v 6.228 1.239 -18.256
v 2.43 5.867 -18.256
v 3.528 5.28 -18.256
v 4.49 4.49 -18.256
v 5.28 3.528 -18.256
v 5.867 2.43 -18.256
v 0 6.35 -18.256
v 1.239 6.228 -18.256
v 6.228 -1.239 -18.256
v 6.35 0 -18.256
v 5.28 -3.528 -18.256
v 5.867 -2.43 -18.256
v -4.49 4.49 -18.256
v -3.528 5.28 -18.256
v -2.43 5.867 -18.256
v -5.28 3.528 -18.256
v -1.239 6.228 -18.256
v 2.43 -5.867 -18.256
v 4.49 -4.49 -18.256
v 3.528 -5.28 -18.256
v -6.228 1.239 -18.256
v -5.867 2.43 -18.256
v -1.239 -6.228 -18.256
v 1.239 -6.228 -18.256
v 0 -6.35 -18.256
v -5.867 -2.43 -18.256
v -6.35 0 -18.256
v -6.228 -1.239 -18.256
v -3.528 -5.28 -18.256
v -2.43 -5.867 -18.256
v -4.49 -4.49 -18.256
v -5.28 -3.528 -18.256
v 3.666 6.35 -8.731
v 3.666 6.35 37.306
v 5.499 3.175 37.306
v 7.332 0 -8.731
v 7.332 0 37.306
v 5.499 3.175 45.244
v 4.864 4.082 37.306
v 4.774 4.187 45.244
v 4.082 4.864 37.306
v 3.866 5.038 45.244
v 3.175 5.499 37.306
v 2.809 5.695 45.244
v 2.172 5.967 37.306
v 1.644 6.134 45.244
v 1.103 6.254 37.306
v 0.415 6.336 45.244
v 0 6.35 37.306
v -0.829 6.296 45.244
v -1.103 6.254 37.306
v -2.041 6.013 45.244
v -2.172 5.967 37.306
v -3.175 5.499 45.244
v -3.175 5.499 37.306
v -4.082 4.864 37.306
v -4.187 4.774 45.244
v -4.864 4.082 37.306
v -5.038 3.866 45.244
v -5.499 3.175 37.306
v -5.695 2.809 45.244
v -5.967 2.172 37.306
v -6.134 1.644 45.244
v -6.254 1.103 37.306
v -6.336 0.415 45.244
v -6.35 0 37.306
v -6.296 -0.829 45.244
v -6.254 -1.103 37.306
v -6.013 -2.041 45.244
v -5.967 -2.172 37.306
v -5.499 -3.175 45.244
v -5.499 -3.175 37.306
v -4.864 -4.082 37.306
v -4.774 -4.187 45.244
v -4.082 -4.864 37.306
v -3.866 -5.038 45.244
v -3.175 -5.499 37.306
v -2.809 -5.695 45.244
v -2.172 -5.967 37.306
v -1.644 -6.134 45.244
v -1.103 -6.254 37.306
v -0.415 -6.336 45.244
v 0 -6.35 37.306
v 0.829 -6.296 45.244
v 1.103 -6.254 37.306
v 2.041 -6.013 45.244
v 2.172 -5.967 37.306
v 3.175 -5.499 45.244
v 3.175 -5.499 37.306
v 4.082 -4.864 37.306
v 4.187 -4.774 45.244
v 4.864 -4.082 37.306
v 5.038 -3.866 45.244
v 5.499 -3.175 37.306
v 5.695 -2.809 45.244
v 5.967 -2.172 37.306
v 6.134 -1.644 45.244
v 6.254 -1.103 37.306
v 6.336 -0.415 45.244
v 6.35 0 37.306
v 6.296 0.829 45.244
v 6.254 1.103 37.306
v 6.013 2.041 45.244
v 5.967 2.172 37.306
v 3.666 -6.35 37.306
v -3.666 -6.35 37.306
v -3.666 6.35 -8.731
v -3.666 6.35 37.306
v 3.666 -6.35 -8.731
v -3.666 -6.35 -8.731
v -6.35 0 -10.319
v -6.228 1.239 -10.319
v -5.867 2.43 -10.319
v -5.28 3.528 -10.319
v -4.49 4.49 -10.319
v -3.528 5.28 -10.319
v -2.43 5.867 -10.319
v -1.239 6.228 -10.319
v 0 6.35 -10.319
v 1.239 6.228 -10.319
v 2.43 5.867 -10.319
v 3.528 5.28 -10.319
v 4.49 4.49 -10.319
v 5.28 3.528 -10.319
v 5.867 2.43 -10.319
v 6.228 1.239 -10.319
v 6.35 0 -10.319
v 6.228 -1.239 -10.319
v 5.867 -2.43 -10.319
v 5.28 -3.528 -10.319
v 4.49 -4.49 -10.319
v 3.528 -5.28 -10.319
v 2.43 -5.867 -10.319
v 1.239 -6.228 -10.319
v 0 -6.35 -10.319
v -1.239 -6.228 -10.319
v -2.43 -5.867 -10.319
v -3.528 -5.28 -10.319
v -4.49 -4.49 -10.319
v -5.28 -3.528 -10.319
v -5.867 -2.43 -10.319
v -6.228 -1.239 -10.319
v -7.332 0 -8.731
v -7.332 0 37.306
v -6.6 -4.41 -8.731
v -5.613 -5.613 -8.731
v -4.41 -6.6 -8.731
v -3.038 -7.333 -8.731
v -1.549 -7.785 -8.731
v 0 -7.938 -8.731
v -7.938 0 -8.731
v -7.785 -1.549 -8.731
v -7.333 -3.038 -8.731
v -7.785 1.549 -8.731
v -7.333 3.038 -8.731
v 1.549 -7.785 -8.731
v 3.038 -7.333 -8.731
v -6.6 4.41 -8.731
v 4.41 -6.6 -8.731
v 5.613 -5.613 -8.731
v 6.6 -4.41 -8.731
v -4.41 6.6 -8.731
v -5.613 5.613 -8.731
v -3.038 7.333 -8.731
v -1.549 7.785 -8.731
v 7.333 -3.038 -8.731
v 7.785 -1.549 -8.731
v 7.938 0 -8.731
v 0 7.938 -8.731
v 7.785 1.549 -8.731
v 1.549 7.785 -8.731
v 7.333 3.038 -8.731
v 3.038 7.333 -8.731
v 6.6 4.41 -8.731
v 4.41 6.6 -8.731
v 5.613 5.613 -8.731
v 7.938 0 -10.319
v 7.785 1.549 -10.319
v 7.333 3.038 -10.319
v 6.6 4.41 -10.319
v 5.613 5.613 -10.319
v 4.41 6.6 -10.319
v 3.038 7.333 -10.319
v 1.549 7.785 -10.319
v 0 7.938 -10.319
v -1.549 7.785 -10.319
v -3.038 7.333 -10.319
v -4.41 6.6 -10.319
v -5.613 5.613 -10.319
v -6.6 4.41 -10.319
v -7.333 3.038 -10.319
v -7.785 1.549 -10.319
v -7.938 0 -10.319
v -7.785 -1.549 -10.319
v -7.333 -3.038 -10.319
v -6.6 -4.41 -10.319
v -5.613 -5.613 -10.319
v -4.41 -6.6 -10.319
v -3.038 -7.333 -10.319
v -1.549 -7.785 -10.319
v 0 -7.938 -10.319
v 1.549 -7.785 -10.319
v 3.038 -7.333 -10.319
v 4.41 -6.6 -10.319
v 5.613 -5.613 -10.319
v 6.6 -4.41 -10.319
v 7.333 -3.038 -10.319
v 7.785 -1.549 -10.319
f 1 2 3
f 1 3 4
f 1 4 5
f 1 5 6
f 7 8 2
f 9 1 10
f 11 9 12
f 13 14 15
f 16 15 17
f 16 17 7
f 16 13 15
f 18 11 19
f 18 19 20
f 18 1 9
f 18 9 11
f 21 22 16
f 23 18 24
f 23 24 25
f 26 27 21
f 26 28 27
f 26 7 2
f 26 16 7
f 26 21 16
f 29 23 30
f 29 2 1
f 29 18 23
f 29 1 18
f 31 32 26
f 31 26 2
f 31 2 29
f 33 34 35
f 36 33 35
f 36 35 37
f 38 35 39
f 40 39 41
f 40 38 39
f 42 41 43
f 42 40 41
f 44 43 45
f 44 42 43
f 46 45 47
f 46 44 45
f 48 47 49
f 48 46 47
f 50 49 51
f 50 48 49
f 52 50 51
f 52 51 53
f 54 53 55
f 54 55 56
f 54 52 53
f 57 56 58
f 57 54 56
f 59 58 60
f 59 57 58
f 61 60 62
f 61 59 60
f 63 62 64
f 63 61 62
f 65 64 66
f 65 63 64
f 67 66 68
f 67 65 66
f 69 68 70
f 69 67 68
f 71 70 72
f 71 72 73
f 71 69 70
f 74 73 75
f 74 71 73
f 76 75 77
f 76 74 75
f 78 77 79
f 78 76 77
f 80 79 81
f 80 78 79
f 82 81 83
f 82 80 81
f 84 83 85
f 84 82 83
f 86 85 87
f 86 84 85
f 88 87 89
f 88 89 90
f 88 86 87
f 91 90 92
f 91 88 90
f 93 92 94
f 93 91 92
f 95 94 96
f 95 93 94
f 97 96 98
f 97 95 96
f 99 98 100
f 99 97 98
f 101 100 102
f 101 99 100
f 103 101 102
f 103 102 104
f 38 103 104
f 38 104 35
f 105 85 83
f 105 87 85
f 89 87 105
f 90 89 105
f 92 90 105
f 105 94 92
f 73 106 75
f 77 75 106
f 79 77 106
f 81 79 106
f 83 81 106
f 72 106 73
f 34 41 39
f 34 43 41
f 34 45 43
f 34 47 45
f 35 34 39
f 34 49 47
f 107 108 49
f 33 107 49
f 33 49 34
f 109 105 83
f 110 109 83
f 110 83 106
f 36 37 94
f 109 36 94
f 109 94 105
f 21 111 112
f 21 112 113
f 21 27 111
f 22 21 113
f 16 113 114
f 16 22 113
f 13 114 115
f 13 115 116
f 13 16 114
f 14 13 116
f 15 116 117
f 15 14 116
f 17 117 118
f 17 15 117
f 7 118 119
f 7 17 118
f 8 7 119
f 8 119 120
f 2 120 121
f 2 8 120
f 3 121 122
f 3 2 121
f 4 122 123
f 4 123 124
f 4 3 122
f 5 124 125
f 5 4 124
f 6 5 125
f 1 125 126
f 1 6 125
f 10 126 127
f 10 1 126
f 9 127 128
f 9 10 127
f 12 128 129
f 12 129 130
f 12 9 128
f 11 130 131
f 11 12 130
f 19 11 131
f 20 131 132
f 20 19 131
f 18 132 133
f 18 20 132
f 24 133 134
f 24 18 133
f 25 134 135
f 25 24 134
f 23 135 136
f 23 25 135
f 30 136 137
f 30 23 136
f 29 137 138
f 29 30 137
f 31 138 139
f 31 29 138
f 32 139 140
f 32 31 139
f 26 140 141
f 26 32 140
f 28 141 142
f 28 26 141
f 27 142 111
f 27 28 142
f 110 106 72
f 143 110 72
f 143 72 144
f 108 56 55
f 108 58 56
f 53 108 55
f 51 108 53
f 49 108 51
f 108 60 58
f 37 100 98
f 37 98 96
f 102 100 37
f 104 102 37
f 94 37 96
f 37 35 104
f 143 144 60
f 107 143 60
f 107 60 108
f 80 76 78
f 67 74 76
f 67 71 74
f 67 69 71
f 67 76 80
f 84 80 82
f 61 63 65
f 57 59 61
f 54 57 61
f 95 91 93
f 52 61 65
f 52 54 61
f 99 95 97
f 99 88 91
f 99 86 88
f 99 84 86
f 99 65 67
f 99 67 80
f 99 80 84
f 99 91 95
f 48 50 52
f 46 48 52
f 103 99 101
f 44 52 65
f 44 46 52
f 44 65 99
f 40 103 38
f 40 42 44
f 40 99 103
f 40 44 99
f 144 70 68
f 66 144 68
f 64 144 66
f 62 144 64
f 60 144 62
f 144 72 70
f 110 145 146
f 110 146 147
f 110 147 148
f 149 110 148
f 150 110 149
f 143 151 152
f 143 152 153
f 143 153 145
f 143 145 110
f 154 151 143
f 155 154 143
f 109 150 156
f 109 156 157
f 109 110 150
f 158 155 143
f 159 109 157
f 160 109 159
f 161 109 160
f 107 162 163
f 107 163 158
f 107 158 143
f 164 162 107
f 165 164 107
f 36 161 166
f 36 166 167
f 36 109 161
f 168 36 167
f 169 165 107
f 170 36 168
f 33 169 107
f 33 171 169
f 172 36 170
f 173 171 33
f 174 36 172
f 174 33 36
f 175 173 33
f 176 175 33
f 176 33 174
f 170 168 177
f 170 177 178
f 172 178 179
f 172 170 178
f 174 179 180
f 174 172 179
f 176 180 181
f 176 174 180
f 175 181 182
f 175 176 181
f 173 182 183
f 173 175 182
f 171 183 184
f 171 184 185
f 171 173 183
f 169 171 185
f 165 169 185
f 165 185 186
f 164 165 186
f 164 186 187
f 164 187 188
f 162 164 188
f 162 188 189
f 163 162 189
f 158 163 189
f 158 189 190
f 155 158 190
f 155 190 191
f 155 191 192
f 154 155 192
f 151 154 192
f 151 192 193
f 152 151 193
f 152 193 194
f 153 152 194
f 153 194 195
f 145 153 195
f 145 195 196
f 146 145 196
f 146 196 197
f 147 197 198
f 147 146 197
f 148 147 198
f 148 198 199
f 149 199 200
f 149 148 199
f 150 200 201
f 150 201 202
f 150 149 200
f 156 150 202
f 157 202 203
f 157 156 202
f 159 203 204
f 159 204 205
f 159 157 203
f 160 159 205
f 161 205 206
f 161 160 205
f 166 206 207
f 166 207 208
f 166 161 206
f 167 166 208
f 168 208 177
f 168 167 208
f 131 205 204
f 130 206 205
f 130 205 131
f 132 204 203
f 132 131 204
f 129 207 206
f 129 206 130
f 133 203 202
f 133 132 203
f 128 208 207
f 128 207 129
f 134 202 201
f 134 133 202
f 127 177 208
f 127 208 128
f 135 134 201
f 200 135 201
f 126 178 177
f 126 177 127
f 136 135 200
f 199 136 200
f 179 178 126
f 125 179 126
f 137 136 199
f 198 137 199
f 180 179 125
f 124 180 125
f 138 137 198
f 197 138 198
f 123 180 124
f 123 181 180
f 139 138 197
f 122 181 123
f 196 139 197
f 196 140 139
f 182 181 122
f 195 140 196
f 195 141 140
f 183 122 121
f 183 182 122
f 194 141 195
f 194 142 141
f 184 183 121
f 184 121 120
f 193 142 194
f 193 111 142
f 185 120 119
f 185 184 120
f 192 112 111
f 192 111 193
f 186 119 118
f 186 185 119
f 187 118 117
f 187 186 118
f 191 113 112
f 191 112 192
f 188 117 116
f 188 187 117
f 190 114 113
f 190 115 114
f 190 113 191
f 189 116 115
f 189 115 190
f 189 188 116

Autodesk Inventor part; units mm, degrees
ref_plane "YZ Plane" through (0, 0, 0) normal (1, 0, 0) x (0, 1, 0)
ref_plane "XZ Plane" through (0, 0, 0) normal (0, 1, 0) x (-1, 0, 0)
ref_plane "XY Plane" through (0, 0, 0) normal (0, 0, 1) x (1, 0, 0)
sketch "Sketch1" plane through (0, 0, 0) normal (0, 0, 1) x (1, 0, 0)
  circle A0 centre (0, 0) radius 7.9375
  dimension "d0" = 15.875
extrude "Extrusion1" add sketch "Sketch1" along normal mid plane 90.4875
sketch "Sketch2" plane through (0, 0, 45.2437) normal (0, 0, 1) x (1, 0, 0)
  line L0 (-3.6662, 6.35) -> (3.6662, 6.35)
  line L1 (3.6662, 6.35) -> (7.3323, 0)
  line L2 (7.3323, 0) -> (3.6662, -6.35)
  line L3 (3.6662, -6.35) -> (-3.6662, -6.35)
  line L4 (-3.6662, -6.35) -> (-7.3323, 0)
  line L5 (-7.3323, 0) -> (-3.6662, 6.35)
  circle A0 centre (0, 0) radius 7.9375 projected
  point P0 (0, -6.35)
  point P1 (0, 6.35)
  dimension "d3" = 12.7
extrude "Extrusion2" cut sketch "Sketch2" against normal blind 53.975
sketch "Sketch3" plane through (0, 0, 45.2437) normal (0, 0, 1) x (1, 0, 0)
  circle A0 centre (0, 0) radius 6.35
  circle A1 centre (0, 0) radius 7.9375 projected
  line L0 (3.6662, 6.35) -> (-3.6662, 6.35) projected
  line L1 (7.3323, 0) -> (3.6662, 6.35) projected
  line L2 (3.6662, -6.35) -> (7.3323, 0) projected
  line L3 (-3.6662, -6.35) -> (3.6662, -6.35) projected
  line L4 (-7.3323, 0) -> (-3.6662, -6.35) projected
  line L5 (-3.6662, 6.35) -> (-7.3323, 0) projected
  point P0 (-5.4993, 3.175)
  point P1 (0, 6.35)
  point P2 (-5.4993, -3.175)
  point P3 (0, -6.35)
  point P4 (5.4993, -3.175)
  point P5 (5.4993, 3.175)
  dimension "d6" = 12.7
extrude "Extrusion3" cut sketch "Sketch3" against normal blind 7.9375 contours A0 L1 L2 | A0 L0 L1 | L2 L3 A0 | A0 L5 L0 | L3 L4 A0 | A0 L4 L5
sketch "Sketch4" plane through (0, 0, 0) normal (1, 0, 0) x (0, 1, 0)
  line L0 (7.9375, -18.2562) -> (-7.9375, -18.2562)
  line L1 (-7.9375, -18.2562) -> (-7.9375, -45.2437)
  line L2 (-7.9375, -45.2437) -> (7.9375, -45.2437)
  line L3 (7.9375, -45.2437) -> (7.9375, -18.2562)
  line L4 (7.9375, -45.2437) -> (-7.9375, -45.2437) construction
  line L5 (-7.9375, -45.2437) -> (-7.9375, -8.7312) construction
  line L6 (-7.9375, -8.7312) -> (-6.35, -8.7312) construction
  line L7 (-6.35, -8.7312) -> (-6.35, 37.3062) construction
  line L8 (-6.35, 37.3062) -> (-6.35, 45.2437) construction
  line L9 (-6.35, 45.2437) -> (6.35, 45.2437) construction
  line L10 (6.35, 45.2437) -> (6.35, 37.3062) construction
  line L11 (6.35, 37.3062) -> (6.35, -8.7312) construction
  line L12 (6.35, -8.7312) -> (7.9375, -8.7312) construction
  line L13 (7.9375, -8.7312) -> (7.9375, -45.2437) construction
  line L14 (-7.9375, -45.2437) -> (7.9375, -45.2437) construction
  point P0 (0, 0)
  dimension "d9" = 63.5
extrude "Extrusion4" cut sketch "Sketch4" along normal through all both and the other way through all
sketch "Sketch5" plane through (0, 0, -18.2562) normal (0, 0, -1) x (-1, 0, 0)
  circle A0 centre (0, 0) radius 7.9375 construction
  circle A1 centre (0, 0) radius 7.9375
  circle A2 centre (0, 0) radius 6.35
  point P0 (0, 0)
  dimension "d12" = 12.7
extrude "Extrusion5" cut sketch "Sketch5" against normal blind 7.9375
equation "\"d12\" = d6"
equation "\"d13\" = d7"
equation "\"d7\" = 7.9375"
properties part number "EL2-C2-001" material "Aluminum 6061"
